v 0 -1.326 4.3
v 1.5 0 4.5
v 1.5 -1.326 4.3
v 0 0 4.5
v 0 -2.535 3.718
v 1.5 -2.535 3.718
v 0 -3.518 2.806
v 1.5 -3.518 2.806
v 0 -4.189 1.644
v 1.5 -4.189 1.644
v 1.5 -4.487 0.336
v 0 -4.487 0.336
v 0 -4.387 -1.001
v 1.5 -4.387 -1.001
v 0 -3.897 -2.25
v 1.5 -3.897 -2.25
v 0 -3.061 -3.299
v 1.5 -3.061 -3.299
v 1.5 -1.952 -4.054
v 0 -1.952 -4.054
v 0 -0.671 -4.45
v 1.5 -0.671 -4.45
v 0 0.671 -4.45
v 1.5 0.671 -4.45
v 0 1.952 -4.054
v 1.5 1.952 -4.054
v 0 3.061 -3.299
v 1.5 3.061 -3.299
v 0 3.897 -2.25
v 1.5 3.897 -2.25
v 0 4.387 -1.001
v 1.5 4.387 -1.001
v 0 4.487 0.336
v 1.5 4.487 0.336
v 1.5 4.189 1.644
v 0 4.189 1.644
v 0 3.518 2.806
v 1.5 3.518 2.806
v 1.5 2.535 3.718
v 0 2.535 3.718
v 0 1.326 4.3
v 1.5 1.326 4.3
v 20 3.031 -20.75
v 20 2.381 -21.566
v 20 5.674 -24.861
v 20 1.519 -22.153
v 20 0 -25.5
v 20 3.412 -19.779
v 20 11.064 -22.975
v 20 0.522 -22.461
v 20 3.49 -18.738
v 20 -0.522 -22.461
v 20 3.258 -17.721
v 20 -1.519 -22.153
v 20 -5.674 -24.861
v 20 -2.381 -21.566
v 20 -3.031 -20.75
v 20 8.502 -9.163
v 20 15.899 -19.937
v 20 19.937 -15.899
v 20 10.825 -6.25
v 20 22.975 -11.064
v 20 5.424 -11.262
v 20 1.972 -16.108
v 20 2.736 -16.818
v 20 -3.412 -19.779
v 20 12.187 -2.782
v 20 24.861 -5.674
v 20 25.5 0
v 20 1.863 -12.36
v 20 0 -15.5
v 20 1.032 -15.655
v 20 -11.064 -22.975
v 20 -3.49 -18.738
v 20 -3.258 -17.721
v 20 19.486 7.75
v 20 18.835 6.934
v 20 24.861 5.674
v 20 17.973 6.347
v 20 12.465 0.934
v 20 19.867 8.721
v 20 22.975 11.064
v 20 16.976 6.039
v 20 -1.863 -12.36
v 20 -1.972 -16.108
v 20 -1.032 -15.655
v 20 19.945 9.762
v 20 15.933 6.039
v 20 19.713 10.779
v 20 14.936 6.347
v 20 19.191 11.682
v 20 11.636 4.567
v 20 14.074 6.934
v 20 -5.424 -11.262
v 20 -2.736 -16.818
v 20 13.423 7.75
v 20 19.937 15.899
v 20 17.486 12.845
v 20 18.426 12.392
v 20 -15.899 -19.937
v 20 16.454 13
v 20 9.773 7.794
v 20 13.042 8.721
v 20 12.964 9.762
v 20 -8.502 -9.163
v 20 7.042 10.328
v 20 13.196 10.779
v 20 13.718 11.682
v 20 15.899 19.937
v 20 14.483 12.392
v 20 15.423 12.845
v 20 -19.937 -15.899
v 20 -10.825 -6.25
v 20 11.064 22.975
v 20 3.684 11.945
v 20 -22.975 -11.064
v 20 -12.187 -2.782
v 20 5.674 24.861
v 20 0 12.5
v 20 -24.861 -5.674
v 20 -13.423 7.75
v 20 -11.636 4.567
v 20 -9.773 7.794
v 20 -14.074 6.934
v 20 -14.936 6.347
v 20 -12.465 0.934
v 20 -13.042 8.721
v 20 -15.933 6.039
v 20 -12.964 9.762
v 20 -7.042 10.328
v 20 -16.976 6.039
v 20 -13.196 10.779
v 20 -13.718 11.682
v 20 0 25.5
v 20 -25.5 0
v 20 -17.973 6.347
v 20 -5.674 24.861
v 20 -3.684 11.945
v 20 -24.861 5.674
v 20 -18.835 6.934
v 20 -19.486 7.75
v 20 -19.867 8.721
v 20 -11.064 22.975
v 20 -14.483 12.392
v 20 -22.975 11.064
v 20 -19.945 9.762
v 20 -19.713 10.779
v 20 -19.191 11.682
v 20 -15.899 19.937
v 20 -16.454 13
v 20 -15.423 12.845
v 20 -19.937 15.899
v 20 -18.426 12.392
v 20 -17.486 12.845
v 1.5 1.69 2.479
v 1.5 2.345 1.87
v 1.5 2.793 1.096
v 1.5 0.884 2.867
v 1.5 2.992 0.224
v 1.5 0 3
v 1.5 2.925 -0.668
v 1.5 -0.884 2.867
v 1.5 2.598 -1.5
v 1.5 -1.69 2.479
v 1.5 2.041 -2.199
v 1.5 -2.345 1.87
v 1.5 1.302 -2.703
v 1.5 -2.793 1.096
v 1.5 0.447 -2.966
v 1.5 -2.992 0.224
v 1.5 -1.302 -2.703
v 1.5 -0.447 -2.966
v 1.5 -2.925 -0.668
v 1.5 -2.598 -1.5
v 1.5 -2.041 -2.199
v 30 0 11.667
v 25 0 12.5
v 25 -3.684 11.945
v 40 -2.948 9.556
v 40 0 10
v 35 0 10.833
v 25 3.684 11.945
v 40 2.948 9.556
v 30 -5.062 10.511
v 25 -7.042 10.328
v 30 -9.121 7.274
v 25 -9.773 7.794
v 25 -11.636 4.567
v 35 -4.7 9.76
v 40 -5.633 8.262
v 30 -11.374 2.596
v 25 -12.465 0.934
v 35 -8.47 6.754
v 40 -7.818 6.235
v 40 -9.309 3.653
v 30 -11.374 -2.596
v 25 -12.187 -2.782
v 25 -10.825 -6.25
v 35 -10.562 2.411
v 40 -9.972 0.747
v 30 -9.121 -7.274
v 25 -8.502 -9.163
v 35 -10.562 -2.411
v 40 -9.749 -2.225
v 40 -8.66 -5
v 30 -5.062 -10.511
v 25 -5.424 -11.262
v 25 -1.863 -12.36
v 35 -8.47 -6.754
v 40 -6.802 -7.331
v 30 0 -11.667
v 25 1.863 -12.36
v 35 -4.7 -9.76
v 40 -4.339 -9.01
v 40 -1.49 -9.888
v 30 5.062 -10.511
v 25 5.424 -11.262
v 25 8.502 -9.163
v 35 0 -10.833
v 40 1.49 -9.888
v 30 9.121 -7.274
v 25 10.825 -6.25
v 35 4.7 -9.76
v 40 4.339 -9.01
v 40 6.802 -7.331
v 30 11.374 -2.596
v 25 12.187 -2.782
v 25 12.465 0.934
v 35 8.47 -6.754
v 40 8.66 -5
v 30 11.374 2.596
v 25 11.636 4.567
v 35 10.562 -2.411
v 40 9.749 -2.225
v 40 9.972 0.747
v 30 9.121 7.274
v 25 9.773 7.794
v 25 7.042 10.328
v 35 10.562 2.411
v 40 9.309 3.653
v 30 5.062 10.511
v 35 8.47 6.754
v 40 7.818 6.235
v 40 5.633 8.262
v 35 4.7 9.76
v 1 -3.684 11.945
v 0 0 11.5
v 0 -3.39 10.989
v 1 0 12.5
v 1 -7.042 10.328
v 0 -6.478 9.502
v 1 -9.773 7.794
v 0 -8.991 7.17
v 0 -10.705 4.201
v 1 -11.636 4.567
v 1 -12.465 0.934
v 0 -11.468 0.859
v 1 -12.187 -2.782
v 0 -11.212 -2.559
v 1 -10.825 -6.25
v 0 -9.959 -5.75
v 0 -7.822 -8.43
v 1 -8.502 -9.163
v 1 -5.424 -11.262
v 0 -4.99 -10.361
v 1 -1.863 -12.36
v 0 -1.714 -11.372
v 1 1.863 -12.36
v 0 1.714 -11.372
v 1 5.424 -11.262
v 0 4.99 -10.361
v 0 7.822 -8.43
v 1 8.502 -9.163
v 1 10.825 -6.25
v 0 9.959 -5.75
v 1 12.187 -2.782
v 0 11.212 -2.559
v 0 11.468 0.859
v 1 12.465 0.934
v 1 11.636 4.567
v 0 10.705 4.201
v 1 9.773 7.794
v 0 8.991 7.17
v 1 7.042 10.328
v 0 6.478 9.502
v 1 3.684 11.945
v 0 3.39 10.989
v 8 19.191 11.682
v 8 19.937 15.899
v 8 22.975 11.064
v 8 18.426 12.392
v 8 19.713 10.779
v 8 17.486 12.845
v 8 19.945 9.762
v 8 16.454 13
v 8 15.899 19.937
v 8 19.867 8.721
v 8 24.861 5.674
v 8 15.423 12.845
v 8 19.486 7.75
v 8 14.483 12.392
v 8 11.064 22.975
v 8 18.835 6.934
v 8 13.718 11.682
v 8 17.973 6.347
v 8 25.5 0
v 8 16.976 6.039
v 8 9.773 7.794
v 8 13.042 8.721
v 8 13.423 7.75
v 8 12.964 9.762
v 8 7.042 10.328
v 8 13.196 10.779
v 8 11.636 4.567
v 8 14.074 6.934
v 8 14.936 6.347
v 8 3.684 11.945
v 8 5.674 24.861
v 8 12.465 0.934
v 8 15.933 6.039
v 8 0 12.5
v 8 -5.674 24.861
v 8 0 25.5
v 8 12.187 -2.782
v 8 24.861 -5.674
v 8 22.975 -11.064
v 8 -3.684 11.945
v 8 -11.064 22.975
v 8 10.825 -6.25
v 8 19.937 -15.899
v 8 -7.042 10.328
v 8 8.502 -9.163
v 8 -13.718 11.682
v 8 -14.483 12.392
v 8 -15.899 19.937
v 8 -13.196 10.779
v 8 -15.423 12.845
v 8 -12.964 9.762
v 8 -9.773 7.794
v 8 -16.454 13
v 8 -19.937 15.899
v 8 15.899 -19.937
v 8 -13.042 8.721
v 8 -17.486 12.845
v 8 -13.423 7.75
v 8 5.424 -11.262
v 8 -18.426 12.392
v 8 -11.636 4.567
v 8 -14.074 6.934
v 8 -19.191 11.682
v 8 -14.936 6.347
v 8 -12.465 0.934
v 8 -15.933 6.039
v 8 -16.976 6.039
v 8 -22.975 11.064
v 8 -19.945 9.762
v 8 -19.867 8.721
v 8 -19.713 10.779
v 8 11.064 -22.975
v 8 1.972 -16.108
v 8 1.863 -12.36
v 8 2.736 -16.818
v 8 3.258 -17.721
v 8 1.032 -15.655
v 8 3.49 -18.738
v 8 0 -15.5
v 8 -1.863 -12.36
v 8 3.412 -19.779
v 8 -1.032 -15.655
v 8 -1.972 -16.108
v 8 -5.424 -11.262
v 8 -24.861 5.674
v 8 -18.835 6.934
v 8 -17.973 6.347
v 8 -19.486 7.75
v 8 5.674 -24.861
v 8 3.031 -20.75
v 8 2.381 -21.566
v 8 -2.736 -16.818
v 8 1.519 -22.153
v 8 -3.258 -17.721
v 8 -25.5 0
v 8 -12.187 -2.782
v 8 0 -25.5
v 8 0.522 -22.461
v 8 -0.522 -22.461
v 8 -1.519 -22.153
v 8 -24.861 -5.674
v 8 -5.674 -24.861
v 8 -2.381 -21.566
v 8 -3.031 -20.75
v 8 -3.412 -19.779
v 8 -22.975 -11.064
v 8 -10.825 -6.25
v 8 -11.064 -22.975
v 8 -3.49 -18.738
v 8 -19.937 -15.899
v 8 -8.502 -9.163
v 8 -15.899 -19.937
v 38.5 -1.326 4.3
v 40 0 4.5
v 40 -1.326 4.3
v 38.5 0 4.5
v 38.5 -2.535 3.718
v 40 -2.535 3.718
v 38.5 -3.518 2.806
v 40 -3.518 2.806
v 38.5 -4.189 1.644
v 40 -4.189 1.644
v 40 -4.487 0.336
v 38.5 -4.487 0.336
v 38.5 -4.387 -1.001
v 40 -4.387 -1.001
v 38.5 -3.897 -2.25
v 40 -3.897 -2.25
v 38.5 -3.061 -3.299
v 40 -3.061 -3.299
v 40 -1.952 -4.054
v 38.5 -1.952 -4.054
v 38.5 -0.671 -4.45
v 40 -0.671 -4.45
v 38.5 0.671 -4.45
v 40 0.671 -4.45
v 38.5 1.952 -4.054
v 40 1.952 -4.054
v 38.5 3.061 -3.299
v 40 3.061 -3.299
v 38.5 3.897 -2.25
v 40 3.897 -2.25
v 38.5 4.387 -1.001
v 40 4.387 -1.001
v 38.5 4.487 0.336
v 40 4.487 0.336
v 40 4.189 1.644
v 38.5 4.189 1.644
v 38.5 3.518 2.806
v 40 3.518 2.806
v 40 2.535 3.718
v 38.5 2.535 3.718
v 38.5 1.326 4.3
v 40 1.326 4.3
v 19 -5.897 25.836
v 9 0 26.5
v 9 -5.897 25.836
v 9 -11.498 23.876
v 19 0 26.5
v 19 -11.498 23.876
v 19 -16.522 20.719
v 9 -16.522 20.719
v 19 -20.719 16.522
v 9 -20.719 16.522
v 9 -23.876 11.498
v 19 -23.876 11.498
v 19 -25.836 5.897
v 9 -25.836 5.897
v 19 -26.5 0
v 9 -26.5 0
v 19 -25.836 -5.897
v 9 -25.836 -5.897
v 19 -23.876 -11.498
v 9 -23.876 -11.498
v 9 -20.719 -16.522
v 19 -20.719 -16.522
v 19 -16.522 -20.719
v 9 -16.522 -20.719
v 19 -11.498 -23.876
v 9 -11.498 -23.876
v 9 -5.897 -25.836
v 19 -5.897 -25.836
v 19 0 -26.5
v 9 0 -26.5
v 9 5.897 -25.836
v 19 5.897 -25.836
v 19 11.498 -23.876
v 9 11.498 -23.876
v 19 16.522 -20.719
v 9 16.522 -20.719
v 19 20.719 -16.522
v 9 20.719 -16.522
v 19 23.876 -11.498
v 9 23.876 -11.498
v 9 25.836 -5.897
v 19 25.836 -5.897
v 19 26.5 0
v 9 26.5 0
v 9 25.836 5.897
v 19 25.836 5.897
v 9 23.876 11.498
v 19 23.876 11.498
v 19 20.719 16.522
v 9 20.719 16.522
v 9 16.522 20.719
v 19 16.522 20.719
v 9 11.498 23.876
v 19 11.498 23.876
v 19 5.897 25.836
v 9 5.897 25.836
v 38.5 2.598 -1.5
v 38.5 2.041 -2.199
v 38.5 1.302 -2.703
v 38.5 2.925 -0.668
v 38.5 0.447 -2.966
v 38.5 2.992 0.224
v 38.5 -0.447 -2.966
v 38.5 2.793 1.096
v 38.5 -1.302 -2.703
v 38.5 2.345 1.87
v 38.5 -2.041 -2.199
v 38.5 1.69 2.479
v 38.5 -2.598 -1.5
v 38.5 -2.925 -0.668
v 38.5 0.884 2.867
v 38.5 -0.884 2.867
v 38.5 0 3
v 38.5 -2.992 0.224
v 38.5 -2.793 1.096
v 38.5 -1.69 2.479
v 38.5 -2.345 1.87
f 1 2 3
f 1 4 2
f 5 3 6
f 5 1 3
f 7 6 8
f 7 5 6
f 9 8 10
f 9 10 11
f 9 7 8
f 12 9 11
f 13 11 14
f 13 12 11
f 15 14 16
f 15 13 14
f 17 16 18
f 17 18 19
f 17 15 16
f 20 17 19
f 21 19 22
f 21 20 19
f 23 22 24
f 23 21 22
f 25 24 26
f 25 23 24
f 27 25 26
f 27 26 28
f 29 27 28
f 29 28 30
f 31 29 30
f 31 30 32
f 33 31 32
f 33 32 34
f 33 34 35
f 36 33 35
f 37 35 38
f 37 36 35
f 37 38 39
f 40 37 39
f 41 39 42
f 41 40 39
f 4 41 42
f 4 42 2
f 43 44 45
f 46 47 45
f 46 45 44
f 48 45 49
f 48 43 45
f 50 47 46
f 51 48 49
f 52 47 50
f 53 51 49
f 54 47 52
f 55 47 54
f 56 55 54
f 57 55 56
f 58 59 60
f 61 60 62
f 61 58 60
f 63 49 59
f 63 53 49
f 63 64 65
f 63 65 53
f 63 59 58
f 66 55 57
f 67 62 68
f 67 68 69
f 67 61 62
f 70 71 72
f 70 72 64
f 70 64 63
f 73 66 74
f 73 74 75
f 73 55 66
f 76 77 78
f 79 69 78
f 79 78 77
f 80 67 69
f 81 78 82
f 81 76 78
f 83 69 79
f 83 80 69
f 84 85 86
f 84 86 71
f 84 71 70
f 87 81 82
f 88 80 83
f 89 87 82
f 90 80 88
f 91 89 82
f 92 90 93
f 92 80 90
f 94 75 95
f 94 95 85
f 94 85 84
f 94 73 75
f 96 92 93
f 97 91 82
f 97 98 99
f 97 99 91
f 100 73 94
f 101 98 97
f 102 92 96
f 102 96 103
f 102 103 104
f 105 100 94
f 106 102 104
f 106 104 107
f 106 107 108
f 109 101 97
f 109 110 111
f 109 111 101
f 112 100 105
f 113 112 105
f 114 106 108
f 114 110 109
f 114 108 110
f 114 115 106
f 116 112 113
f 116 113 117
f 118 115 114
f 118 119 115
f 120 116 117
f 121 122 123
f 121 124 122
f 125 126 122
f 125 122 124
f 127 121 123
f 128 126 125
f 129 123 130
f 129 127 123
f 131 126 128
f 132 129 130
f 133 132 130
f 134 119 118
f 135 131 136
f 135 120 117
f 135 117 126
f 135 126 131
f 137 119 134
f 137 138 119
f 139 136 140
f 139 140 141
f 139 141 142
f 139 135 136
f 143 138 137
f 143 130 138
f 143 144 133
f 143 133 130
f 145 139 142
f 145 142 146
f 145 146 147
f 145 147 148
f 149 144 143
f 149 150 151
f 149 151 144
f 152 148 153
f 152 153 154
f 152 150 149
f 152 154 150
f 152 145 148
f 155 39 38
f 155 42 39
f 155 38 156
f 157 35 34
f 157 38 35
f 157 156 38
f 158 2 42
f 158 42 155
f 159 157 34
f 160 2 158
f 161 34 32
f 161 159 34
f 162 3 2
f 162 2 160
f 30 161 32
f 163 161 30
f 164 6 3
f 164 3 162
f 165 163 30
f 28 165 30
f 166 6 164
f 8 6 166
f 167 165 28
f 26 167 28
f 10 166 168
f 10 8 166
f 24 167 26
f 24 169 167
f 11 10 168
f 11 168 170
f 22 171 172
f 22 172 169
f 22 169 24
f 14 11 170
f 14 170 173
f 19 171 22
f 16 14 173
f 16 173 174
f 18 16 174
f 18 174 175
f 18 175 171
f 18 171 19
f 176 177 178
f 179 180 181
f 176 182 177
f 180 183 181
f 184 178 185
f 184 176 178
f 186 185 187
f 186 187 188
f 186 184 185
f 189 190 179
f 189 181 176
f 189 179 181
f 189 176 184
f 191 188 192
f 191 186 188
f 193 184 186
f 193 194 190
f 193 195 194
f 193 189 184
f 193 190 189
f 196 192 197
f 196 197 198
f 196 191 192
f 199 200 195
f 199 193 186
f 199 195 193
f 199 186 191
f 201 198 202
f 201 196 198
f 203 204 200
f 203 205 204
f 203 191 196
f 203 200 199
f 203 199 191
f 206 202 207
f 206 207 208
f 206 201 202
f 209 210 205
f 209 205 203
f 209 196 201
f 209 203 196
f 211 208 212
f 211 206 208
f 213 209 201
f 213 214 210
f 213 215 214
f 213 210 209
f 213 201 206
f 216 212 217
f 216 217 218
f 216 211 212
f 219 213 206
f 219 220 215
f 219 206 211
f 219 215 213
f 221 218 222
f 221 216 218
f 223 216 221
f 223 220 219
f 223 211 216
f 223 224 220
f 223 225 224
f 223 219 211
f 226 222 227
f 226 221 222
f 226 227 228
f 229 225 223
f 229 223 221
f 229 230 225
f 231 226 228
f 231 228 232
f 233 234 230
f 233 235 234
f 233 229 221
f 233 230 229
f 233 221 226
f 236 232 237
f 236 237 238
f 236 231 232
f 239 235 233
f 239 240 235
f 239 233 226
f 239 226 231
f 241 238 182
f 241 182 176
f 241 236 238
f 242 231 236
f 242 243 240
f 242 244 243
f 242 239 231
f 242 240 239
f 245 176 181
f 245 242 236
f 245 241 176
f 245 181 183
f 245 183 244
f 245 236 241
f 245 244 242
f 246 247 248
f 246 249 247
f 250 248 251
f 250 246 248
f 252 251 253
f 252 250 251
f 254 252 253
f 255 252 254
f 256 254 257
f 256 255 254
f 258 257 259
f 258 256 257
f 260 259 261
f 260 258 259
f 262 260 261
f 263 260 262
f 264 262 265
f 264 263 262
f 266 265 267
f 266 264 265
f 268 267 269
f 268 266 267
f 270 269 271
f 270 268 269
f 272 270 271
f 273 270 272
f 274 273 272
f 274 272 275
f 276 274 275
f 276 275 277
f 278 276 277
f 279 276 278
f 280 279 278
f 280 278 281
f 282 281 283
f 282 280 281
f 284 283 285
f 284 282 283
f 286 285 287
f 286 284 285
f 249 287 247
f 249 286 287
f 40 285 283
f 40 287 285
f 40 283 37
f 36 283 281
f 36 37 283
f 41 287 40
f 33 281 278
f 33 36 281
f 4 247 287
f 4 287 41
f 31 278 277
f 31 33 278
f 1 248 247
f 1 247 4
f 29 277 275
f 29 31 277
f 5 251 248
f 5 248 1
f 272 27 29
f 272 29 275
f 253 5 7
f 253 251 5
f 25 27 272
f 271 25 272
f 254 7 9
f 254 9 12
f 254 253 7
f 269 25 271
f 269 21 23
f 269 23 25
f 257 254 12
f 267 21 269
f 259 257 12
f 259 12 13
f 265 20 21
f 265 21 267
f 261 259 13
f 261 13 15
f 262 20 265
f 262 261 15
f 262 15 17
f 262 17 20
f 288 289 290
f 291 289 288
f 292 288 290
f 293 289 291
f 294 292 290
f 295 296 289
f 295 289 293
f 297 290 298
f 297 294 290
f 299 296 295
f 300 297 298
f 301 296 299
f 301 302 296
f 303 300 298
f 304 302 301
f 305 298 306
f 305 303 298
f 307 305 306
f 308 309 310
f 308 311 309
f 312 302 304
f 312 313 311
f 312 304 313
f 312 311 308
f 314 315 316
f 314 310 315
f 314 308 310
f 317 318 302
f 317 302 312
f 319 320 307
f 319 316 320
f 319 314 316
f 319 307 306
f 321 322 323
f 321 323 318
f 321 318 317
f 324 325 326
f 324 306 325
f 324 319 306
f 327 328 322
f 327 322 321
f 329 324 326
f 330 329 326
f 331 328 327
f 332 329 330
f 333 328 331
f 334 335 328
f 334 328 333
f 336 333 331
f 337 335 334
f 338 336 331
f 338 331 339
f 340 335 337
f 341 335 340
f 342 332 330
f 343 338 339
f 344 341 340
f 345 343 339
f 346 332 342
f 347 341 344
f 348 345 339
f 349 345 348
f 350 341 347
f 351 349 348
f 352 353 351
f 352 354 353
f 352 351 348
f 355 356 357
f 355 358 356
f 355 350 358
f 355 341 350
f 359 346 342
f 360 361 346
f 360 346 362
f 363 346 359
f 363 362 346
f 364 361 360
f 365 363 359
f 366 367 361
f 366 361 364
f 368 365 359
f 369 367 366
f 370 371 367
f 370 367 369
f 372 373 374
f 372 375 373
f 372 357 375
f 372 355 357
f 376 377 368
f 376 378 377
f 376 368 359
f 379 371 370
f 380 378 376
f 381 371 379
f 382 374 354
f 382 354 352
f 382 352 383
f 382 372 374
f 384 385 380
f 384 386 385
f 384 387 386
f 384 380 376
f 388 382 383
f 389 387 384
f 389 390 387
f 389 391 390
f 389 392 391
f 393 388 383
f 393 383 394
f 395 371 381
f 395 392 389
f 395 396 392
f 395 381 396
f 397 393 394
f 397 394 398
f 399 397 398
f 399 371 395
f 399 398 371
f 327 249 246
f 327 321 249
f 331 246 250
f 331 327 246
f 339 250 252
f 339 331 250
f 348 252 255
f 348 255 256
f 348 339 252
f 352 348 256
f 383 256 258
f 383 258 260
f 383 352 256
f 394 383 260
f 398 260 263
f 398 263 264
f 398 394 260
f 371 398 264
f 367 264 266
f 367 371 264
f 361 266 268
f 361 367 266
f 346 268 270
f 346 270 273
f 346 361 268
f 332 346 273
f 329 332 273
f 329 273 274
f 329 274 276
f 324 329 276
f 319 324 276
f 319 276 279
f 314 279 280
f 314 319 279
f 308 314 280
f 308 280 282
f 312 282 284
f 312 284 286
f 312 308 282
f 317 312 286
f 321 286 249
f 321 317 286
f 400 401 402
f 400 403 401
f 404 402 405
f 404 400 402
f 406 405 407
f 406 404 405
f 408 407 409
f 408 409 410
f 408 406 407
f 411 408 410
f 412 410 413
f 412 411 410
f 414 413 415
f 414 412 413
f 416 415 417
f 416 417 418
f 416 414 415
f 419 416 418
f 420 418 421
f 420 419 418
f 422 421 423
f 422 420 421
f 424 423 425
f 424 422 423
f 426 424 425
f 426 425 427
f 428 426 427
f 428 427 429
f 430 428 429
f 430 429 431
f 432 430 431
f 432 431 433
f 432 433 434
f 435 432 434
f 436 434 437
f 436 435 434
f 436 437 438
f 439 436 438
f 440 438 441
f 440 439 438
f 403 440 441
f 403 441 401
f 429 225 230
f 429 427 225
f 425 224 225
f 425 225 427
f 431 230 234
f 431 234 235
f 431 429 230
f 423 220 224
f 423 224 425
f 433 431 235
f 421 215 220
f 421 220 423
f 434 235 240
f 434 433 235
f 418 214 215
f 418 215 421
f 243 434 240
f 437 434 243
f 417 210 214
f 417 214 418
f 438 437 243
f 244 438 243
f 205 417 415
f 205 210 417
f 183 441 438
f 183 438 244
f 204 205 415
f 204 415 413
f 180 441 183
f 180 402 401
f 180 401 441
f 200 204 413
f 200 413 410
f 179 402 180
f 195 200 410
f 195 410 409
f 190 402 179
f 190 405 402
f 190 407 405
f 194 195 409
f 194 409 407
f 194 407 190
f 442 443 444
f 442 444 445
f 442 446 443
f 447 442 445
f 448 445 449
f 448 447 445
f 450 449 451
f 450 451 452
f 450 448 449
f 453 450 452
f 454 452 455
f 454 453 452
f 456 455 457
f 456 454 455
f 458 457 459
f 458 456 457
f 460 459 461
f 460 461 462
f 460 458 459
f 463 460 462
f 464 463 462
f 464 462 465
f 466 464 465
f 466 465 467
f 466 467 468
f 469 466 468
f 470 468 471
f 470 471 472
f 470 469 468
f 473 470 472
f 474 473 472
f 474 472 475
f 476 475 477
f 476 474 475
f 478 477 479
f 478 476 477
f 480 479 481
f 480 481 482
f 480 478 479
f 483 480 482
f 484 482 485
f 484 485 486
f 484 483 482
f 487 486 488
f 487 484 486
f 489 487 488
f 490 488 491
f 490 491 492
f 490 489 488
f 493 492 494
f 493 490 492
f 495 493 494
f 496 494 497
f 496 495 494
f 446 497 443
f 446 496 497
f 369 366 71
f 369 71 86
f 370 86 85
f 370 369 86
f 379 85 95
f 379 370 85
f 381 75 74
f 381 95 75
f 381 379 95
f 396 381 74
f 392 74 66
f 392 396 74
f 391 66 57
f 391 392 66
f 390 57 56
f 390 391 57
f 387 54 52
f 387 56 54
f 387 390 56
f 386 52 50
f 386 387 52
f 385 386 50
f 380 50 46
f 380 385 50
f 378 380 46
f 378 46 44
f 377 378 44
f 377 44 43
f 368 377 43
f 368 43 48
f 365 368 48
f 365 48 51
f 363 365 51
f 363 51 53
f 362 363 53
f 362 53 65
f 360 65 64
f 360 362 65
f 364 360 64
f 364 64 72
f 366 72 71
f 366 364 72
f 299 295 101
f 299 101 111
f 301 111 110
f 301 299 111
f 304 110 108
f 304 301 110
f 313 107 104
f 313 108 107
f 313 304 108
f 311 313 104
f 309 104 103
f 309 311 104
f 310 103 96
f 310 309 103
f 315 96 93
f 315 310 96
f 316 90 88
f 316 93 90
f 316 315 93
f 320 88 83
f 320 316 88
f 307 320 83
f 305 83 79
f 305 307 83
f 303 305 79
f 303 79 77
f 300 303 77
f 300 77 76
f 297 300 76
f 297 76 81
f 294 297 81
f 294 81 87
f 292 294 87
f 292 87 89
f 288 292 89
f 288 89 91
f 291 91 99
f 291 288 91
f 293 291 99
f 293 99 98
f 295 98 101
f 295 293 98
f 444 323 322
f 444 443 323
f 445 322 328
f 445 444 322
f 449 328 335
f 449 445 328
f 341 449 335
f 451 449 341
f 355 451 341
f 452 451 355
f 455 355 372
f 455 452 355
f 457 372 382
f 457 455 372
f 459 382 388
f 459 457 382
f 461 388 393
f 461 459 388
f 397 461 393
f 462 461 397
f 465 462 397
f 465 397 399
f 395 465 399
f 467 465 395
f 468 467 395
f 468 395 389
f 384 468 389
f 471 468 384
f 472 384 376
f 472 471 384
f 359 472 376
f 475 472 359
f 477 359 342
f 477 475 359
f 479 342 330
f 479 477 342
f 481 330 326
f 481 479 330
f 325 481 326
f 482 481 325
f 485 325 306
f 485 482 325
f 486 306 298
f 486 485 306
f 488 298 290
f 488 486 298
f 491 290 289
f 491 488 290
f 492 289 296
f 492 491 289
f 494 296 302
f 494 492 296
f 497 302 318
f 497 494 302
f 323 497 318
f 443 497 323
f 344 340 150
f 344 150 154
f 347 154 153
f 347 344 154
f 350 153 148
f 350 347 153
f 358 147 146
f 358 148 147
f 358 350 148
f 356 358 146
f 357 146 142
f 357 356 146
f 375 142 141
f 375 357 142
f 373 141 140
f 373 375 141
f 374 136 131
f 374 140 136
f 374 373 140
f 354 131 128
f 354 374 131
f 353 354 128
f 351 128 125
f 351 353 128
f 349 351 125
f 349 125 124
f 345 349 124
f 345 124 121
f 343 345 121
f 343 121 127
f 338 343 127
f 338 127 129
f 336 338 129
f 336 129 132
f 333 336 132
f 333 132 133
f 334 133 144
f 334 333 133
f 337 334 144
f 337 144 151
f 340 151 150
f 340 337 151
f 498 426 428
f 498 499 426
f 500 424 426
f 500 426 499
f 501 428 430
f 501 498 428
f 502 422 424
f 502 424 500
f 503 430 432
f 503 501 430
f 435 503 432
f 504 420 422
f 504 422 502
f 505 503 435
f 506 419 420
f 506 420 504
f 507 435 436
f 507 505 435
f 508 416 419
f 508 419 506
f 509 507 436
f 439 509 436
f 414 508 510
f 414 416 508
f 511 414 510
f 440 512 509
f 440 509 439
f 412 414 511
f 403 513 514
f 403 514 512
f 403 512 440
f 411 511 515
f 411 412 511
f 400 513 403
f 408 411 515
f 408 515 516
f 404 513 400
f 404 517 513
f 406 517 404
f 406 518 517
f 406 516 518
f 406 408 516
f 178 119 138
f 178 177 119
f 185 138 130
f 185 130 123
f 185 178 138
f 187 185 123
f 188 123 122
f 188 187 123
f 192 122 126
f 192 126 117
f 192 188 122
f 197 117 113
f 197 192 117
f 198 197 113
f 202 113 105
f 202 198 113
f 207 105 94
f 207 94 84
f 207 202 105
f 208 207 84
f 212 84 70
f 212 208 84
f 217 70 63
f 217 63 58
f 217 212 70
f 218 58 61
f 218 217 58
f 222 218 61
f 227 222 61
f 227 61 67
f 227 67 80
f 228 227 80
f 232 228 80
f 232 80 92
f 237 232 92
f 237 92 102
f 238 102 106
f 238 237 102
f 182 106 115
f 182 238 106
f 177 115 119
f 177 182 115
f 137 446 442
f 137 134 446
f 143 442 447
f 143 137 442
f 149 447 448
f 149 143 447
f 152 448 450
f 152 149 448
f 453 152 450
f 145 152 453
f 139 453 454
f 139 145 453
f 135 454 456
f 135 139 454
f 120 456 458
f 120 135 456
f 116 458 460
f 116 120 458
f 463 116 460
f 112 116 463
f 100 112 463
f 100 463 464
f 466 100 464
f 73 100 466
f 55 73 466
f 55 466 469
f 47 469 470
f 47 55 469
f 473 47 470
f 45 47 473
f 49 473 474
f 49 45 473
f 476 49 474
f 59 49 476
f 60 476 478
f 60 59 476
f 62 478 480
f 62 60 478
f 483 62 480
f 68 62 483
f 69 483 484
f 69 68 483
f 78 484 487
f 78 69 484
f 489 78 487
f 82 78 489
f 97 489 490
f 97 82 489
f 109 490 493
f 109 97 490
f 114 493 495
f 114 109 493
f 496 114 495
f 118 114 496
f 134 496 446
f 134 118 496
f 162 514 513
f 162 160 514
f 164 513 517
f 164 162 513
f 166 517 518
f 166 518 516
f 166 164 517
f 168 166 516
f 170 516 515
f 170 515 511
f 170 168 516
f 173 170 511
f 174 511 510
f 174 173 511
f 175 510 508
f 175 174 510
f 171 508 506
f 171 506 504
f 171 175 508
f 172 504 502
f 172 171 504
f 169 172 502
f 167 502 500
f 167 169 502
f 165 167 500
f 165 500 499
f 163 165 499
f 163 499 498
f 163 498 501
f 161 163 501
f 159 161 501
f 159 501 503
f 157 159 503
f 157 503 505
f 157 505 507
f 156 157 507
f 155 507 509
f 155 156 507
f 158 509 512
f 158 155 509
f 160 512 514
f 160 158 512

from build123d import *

# Parameters (mm, degrees)
SKETCH_2_R          = 3.5
CUT_EXTRUDE_1_DEPTH = 55.813319549


with BuildPart() as part:
    # 草图1 → 旋转1 (revolve)
    with BuildSketch(Plane.XY, mode=Mode.PRIVATE) as revolve_1_sk:
        Polygon((0, 11.5), (1, 12.5), (8, 12.5), (8, 25.5), (9, 26.5), (19, 26.5), (20, 25.5), (20, 12.5), (25, 12.5), (40, 10), (40, 4.5), (38.5, 4.5), (38.5, 3), (1.5, 3), (1.5, 4.5), (0, 4.5), align=None)
    revolve(revolve_1_sk.sketch.rotate(Axis((0, 0, 0), (1, 0, 0)), 90), axis=Axis((0, 0, 0), (1, 0, 0)))

    # 草图2 → 切除-拉伸1 (cut, through all)
    with BuildSketch(Plane(origin=(0, 0, 0), x_dir=(0, 0, -1), z_dir=(1, 0, 0))):
        with Locations(Location((19, 0, 0), (0, 0, 180))):
            Circle(SKETCH_2_R)
        with Locations(Location((-9.5, 16.454482672, 0), (0, 0, 180))):
            Circle(SKETCH_2_R)
        with Locations(Location((-9.5, -16.454482672, 0), (0, 0, 180))):
            Circle(SKETCH_2_R)
    extrude(amount=CUT_EXTRUDE_1_DEPTH, mode=Mode.SUBTRACT)


solid = part.part
